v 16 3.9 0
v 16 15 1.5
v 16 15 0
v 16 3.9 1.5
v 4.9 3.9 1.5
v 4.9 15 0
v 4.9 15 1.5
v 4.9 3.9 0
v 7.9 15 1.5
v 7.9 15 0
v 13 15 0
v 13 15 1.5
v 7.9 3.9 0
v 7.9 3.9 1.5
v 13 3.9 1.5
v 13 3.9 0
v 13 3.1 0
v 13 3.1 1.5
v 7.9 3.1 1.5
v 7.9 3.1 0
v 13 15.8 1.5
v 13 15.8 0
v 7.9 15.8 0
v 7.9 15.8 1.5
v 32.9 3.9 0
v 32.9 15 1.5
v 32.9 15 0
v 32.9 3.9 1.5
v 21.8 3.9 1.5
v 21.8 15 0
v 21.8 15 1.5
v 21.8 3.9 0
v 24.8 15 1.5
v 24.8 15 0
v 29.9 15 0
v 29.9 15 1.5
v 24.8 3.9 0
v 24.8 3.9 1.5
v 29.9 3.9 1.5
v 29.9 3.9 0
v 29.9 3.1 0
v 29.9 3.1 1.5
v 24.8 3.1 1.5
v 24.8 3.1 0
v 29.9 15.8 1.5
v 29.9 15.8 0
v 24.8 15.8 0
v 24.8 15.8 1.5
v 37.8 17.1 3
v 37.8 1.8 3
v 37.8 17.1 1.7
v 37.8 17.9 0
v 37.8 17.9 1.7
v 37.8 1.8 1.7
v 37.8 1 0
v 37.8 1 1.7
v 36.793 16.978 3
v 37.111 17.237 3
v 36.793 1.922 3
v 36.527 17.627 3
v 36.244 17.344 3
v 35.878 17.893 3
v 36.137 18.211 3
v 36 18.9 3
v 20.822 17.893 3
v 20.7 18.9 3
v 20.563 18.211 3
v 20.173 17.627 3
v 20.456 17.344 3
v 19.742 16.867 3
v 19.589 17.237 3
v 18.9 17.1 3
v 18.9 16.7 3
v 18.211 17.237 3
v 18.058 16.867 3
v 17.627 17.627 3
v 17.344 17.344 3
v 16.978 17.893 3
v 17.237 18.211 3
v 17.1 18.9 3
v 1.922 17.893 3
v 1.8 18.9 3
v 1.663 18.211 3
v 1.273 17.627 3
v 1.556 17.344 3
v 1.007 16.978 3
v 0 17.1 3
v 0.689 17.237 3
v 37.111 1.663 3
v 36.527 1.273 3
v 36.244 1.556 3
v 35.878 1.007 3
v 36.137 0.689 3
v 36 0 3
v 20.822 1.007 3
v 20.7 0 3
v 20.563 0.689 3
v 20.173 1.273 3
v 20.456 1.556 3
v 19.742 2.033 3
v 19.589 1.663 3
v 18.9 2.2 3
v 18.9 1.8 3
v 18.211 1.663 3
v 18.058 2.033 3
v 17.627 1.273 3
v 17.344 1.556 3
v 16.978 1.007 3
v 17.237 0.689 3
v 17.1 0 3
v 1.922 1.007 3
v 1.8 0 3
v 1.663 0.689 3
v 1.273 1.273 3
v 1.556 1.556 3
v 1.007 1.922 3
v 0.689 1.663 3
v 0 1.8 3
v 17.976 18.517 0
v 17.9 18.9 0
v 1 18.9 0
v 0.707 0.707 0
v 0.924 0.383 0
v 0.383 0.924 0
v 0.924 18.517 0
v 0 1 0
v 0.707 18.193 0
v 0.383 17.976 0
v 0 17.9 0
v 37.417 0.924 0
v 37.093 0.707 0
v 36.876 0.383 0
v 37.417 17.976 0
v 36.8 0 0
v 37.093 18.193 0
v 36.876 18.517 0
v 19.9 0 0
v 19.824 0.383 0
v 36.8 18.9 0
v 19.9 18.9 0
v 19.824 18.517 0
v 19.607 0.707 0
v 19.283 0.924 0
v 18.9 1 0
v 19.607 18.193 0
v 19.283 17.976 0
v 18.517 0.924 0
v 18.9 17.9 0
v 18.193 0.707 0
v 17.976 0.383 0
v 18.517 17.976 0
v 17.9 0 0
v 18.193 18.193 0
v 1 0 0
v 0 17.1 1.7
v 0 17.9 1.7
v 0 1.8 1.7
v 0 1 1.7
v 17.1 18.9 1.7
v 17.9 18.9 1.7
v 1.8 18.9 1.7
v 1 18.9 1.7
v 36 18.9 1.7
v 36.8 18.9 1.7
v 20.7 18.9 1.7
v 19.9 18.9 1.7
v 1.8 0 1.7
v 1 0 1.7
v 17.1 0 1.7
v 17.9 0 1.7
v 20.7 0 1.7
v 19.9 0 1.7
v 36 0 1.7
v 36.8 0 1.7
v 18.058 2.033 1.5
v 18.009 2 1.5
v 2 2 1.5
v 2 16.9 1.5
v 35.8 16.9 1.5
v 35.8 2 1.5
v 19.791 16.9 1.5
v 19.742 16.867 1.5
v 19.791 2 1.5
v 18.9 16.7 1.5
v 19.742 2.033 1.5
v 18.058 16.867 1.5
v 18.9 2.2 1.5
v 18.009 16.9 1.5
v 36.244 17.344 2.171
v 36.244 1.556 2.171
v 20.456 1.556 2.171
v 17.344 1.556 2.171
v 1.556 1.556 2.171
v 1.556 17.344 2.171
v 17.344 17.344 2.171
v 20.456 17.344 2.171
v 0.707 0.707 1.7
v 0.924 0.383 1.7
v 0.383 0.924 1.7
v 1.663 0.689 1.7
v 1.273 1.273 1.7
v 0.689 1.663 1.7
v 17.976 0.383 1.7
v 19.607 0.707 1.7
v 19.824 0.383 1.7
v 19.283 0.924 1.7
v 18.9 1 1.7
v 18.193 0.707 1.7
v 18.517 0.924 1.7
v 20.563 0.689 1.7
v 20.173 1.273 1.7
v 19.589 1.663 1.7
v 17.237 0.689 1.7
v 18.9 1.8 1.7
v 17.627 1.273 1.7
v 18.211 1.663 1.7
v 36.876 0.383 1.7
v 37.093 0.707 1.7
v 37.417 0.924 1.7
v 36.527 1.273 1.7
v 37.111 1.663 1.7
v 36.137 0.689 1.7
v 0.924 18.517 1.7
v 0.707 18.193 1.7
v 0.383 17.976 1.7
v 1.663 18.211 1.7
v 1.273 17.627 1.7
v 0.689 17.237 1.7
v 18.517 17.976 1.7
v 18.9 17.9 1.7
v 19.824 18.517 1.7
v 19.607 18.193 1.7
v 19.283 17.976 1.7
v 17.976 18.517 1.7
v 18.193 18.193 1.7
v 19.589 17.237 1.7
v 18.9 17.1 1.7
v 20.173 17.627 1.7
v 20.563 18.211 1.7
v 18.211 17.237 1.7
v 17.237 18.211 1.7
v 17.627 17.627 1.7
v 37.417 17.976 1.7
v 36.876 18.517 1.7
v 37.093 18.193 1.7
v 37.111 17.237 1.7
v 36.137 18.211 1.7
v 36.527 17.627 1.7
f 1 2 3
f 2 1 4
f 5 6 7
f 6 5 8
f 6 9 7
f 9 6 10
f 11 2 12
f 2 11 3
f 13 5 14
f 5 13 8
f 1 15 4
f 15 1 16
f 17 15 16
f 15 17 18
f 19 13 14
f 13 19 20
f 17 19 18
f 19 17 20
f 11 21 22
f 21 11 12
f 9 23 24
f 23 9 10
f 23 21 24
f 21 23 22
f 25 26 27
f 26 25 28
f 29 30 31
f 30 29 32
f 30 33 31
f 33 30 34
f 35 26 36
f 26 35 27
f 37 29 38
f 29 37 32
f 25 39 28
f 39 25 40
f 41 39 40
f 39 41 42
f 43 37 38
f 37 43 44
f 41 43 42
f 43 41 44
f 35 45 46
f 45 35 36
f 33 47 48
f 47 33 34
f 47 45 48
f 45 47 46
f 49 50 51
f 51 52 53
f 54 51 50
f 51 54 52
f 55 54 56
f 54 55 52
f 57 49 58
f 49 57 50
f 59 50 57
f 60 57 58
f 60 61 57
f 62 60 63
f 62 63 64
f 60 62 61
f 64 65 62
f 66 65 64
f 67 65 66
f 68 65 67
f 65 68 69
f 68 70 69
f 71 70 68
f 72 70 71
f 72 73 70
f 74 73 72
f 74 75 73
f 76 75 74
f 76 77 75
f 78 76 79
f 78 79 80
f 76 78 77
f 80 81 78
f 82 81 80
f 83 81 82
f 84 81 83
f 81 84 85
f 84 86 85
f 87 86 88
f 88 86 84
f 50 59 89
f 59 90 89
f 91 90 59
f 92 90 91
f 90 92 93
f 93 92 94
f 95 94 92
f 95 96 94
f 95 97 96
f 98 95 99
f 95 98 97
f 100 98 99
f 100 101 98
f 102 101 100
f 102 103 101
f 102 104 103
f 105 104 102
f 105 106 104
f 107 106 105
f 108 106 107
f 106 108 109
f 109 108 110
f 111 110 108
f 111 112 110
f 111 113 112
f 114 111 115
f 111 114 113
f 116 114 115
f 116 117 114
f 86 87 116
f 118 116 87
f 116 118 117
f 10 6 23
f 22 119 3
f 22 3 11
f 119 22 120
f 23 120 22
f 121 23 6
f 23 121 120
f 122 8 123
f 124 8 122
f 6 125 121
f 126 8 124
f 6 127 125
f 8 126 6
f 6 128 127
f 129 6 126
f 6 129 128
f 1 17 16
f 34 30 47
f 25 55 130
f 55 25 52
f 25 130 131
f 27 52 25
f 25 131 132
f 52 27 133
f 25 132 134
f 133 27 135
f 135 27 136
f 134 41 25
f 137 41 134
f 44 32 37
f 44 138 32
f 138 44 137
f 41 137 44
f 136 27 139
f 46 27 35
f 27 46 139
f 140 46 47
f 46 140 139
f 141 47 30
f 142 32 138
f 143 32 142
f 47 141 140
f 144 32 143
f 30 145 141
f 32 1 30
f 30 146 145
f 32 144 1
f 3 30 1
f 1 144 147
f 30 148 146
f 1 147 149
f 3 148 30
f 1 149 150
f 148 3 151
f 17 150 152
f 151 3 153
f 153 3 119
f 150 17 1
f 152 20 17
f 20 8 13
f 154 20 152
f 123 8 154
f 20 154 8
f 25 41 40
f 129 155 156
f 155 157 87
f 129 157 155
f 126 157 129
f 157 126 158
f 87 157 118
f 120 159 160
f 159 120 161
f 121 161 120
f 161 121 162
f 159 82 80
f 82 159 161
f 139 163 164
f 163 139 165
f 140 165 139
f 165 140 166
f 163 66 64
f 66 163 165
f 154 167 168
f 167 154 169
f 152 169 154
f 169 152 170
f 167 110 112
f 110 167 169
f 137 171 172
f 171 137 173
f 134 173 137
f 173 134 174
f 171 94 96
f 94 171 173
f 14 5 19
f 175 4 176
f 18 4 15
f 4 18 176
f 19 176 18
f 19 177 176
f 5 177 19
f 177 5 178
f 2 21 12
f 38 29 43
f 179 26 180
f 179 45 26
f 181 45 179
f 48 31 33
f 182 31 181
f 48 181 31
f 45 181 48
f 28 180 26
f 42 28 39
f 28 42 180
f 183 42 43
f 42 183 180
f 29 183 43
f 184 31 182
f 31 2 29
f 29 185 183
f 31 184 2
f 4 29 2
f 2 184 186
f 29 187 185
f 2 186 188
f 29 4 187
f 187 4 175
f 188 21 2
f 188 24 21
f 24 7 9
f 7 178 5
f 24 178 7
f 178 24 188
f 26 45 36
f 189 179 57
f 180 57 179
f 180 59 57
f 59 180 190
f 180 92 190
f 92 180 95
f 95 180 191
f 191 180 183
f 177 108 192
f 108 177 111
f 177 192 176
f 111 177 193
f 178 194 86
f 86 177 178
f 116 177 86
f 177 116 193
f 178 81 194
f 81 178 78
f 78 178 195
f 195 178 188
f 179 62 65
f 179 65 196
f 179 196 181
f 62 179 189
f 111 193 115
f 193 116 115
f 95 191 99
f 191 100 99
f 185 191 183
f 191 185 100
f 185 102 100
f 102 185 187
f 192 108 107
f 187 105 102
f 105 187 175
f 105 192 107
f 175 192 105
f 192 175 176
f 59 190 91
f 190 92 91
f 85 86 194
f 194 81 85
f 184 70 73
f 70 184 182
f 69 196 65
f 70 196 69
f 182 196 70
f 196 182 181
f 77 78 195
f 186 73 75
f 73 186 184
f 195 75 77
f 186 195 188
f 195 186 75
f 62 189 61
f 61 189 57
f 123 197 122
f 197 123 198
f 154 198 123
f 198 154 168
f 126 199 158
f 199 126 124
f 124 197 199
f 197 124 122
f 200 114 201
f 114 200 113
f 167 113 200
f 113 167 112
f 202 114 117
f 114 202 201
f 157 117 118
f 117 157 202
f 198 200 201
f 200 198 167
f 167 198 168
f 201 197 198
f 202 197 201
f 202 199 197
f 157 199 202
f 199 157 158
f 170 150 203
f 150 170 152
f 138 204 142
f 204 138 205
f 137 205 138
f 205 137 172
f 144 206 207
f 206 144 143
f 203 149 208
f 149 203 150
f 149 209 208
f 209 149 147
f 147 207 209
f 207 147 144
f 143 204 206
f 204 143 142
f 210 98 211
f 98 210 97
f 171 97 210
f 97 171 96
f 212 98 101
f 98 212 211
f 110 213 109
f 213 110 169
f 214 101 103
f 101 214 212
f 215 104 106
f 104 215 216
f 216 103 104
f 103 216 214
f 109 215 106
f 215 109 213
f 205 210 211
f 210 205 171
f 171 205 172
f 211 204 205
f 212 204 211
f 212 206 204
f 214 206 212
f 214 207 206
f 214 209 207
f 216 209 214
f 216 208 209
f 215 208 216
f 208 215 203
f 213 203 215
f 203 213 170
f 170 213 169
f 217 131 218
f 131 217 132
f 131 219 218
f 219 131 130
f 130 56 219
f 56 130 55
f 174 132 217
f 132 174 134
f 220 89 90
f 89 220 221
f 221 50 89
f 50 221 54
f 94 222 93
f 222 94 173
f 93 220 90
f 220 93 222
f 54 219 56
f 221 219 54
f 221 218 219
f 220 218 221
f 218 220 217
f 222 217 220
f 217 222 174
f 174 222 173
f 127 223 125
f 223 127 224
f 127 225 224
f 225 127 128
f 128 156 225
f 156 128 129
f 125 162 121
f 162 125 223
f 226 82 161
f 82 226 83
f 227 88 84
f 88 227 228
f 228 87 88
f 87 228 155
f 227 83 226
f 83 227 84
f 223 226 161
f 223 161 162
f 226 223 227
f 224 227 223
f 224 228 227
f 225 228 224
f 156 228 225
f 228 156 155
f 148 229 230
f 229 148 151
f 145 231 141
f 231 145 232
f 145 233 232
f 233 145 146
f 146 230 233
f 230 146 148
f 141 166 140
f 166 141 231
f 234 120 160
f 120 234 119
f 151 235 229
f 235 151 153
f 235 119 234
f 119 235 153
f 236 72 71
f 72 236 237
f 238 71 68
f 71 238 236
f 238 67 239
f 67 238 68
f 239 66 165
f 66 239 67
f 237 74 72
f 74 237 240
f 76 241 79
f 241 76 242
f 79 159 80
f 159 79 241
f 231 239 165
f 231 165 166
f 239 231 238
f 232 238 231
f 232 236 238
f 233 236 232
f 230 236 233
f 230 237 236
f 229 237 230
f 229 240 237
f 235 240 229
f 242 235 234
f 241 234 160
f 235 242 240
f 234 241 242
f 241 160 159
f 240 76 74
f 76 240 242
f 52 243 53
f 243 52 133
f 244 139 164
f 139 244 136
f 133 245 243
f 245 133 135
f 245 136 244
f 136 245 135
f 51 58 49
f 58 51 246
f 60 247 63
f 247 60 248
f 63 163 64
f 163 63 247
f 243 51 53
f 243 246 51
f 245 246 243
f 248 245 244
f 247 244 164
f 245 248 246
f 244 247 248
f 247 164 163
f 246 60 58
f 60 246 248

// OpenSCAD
//OpenSCAD-Skript

//Moduldefinition mit Parametern für Frontplattensystem im 19mm-Raster
module FrontElem (
//Parameter
xwert=2,        //Anzahl der Segmente in horizontaler Richtung
ywert=1,        //Anzahl der Segmente in vertikaler Richtung
segment=18.9,   //Kantenlänge des Segments
hght=3.0,       //Höhe des Rands des Frontplattensegments
thick=1.5,      //verbleibende Dicke des Frontplattensegments
wo=1.0,         //Wandstärke oben
wu=2.0,         //Wandstärke unten
M3=false,       //Bohrungen für M3-Zylinderkopf-Inbusschraube
skd3=5.6,       //Schraubenkopfdurchmesser M3-Schraube
skh3=3.3,       //Schraubenkopfhöhe M3-Schraube
dsh3=3.1,       //Schaftdurchmesser M3-Schraube
dvst3=7,        //Verstärkung für M3-Schraube
B2mm=true,      //Bohrungen für 2mm-Schneidschrauben
skd2=3.6,       //Schraubenkopfdurchmesser 2mm-Schraube (4.4)
skh2=1.3,       //Schraubenkopfhöhe 2mm-Schraube
dsh2=2.0,       //Schaftdurchmesser 2mm-Schraube
dvst2=4.4,      //Verstärkung für 2mm-Schraube
Btext=6.0,      //Breite Beschriftungsband
Ltext=12,       //Länge Beschriftungsband
Dtext=0.3,      //Tiefe Beschriftungsfeld, oder Null
LEDdia=5.0,     //Durchmesser LED
LEDr=5.0,       //Kantenlänge quadratische LED
LEDB=5.0,       //Breite der Rechteck-LED
LEDH=3.0,       //Höhe der Rechteck-LED
KSWdia=6.0,     //Schaftdurchmesser Kippschalter
RSWdia=9.2,     //Schaftdurchmesser Drehschalter
RSWdist=9.4,    //Mittenabstand Pin
RSWpin=3.0,     //Durchmesser Pin
POTdia=6.8,     //Schaftdurchmesser Poti
TRMdia=4.0,     //Bohrung für Polklemme M4
TRSdia=6.0,     //Bohrung für Telefonbuchse 4mm
MCdia=11.8,     //Bohrung für MC-Buchse 4mm
MCdist=10.4,    //Abstand Abflachungen
BNCdia=9.5,     //Durchmesser Bohrung
BNCdist=8.0,    //Abstand Abflachung
PM3B=22.5,      //Breite Panelmeter 3-stellig
PM3H=14.5,      //Höhe Panelmeter 3-stellig
PM4B=30.0,      //Breite Panelmeter 4-stellig
PM4H=14.2,     //Höhe Panelmeter 4-stellig
leni=6,leno=13.1,swl=8.1,swh=4.1,balken=5.1
)
//Beginn Modul
{
difference(){   //difference 1
union(){        //union 1
difference(){   //difference 2
union(){        //union 2
    //alles, was vor der nächsten geschweiften Klammer steht, wird zusammengefügt (union 2)
//Körper des Frontplattensegments
cube([xwert*segment, ywert*segment, hght]);


}               //union 2 end
    //alles, was vor der nächsten geschweiften Klammer steht, wird davon abgezogen (difference 2)
//Einsenkung in das Segment
polyhedron(
               points= [[wu,wu,thick],                                  //0 unten
                        [xwert*segment-wu,wu,thick],                    //1 unten
                        [xwert*segment-wu,ywert*segment-wu,thick],      //2 unten
                        [wu,ywert*segment-wu,thick],                    //3 unten
                        [wo,wo,hght+0.01],                              //4 oben
                        [wo,ywert*segment-wo, hght+0.01],               //5 oben
                        [xwert*segment-wo,ywert*segment-wo,hght+0.01],  //6 oben
                        [xwert*segment-wo,wo,hght+0.01],                //7 oben
                       ],
               faces=  [[0,1,2,3],      //Boden
                        [0,4,7,1],      //Deckel
                        [1,7,6,2],      //Front
                        [2,6,5,3],      //Seitenwand rechts
                        [3,5,4,0],      //Rückwand
                        [4,5,6,7]]      //Seitenwand links
               );   
//Ausschnitt für Tasterhülsen (bei einzelner Hülse translate() weglassen
translate([-segment/2+1,0,0]) {
translate([(xwert*segment)/2-leno/2+1,(ywert*segment)/2-leno/2+1,-0.1]) cube([leno-2,leno-2,swh+swl]);
translate([(xwert*segment)/2-balken/2,(ywert*segment)/2-leno/2+0.2,-0.1]) cube([balken,(leno-leni)/2-0.8,swh+swl+3]);
translate([(xwert*segment)/2-balken/2,(ywert*segment)/2+leno/2-0.2-(leno-leni)/2+0.8,-0.1]) cube([balken,(leno-leni)/2-0.8,swh+swl+3]);
}
translate([segment/2-1,0,0]) {
translate([(xwert*segment)/2-leno/2+1,(ywert*segment)/2-leno/2+1,-0.1]) cube([leno-2,leno-2,swh+swl]);
translate([(xwert*segment)/2-balken/2,(ywert*segment)/2-leno/2+0.2,-0.1]) cube([balken,(leno-leni)/2-0.8,swh+swl+3]);
translate([(xwert*segment)/2-balken/2,(ywert*segment)/2+leno/2-0.2-(leno-leni)/2+0.8,-0.1]) cube([balken,(leno-leni)/2-0.8,swh+swl+3]);
}
/*
//Bohrung für LED mittig (Mindestgröße 1x1)
translate([xwert*segment/2,ywert*segment/2-3,-0.1])  cylinder(d=LEDdia, h=10, $fn=32);
*/

/*
//Bohrung für LED nach unten versetzt mit Textfeld darüber (Mindestgröße 1x1, bei 10mm LED 1x2)
translate([xwert*segment/2,ywert*segment/2-3,-0.1])  cylinder(d=LEDdia, h=10, $fn=32);
translate([xwert*segment/2-Ltext/2,ywert*segment/2,thick-Dtext+0.05])  cube([Ltext, Btext, Dtext]); 
*/

/*
//Bohrung für Kippschalter mittig (Mindestgröße 1x1)
translate([xwert*segment/2,ywert*segment/2,-0.1])  cylinder(d=KSWdia, h=10, $fn=32); 
*/

/*
//Bohrungen für Drehschalter mit Pin (Mindestgröße 2x2)
translate([xwert*segment/2,ywert*segment/2,-0.1])  cylinder(d=RSWdia, h=10, $fn=32);
translate([xwert*segment/2+RSWdist,ywert*segment/2,-0.1])  cylinder(d=RSWpin, h=1.5, $fn=32);
*/

/*
//Bohrung für Potentiometer 3mm-Schaft (Mindestgröße 1x1)
translate([xwert*segment/2,ywert*segment/2,-0.1])  cylinder(d=POTdia, h=10, $fn=32);
*/

/*
//Bohrung für 4mm-Polklemme M4 (Mindestgröße 1x1)
translate([xwert*segment/2,ywert*segment/2,-0.1])  cylinder(d=TRMdia, h=10, $fn=32);
*/       

/*
//Bohrung für 4mm-Telefonbuchse (Mindestgröße 1x1)
translate([xwert*segment/2,ywert*segment/2,-0.1])  cylinder(d=TRSdia, h=10, $fn=32);
*/

/*
//Bohrung für 4mm-MC-Buchse (Mindestgröße 2x2), siehe auch union1 für Abflachungen
translate([xwert*segment/2,ywert*segment/2,-0.1])  cylinder(d=MCdia, h=10, $fn=32);
*/

/*
//Bohrung für BNC-Buchse (Mindestgröße 1x1), siehe auch union1 für Abflachungen
translate([xwert*segment/2,ywert*segment/2,-0.1])  cylinder(d=BNCdia, h=10, $fn=32);
*/

/*
//Ausschnitt Panelmeter 3-stellig (Mindestgröße 2x1)
translate([xwert*segment/2-PM3B/2,ywert*segment/2-PM3H/2,-0.1])  cube([PM3B, PM3H, 10]);
*/

/*
//Ausschnitt Panelmeter 4-stellig (Mindestgröße 2x1)
translate([xwert*segment/2-PM4B/2,ywert*segment/2-PM4H/2,-0.1])  cube([PM4B, PM4H, 10]);
*/       
        
}  //difference 2 end
    //alles, was vor der nächsten geschweiften Klammer steht, wird dazu hinzugefügt (union 1)
//Verstärkungen für Schrauben x-Achse unten
for (x=[0:segment:xwert*segment])
{
if (M3==true) translate([x,0,0]) cylinder(d=dvst3,h=hght,$fn=16);
if (B2mm==true) translate([x,0,0]) cylinder(d=dvst2,h=hght,$fn=16);
}
//Verstärkungen für Schrauben x-Achse oben
for (x=[0:segment:xwert*segment])
{
if (M3==true) translate([x,ywert*segment,0]) cylinder(d=dvst3,h=hght,$fn=16);
if (B2mm==true) translate([x,ywert*segment,0]) cylinder(d=dvst2,h=hght,$fn=16);
}
//Verstärkungen für Schrauben y-Achse links
for (y=[0:segment:ywert*segment])
{
if (M3==true) translate([0,y,0]) cylinder(d=dvst3,h=hght,$fn=16);
if (B2mm==true) translate([0,y,0]) cylinder(d=dvst2,h=hght,$fn=16);
}
//Verstärkungen für Schrauben y-Achse rechts
for (y=[0:segment:ywert*segment])
{
if (M3==true) translate([xwert*segment,y,0]) cylinder(d=dvst3,h=hght,$fn=16);
if (B2mm==true) translate([xwert*segment,y,0]) cylinder(d=dvst2,h=hght,$fn=16);
}

/*
//Abflachungen für 4mm-MC-Buchse (Mindestgröße 2x2)
translate([xwert*segment/2-5,ywert*segment/2+MCdist/2,0])  cube([10,3,thick]);
translate([xwert*segment/2-5,ywert*segment/2-MCdist/2-3,0])  cube([10,3,thick]);
*/

/*
//Abflachungen für BNC-Buchse (Mindestgröße 1x1)
translate([xwert*segment/2-5,ywert*segment/2+BNCdist/2,0])  cube([10,3,thick]);
translate([xwert*segment/2-5,ywert*segment/2-BNCdist/2-3,0])  cube([10,3,thick]);
*/

}               //union 1 end
    //alles, was vor der nächsten geschweiften Klammer steht, wird davon wieder abgezogen (difference 1)
//Bohrungen für Schrauben x-Achse unten
for (x=[0:segment:xwert*segment])
{
if (M3==true) translate([x,0,-0.1]) cylinder(d=dsh3,h=2*hght,$fn=16);
if (M3==true) translate([x,0,hght-skh3]) cylinder(d=skd3,h=2*hght,$fn=16);
if (B2mm==true) translate([x,0,-0.1]) cylinder(d=dsh2,h=2*hght,$fn=16);
if (B2mm==true) translate([x,0,hght-skh2]) cylinder(d=skd2,h=2*hght,$fn=16); 
}
//Bohrungen für Schrauben x-Achse oben
for (x=[0:segment:xwert*segment])
{
if (M3==true) translate([x,ywert*segment,-0.1]) cylinder(d=dsh3,h=2*hght,$fn=16);
if (M3==true) translate([x,ywert*segment,hght-skh3]) cylinder(d=skd3,h=2*hght,$fn=16);
if (B2mm==true) translate([x,ywert*segment,-0.1]) cylinder(d=dsh2,h=2*hght,$fn=16);
if (B2mm==true) translate([x,ywert*segment,hght-skh2]) cylinder(d=skd2,h=2*hght,$fn=16); 
}
//Bohrungen für Schrauben y-Achse links
for (y=[0:segment:ywert*segment])
{
if (M3==true) translate([0,y,-0.1]) cylinder(d=dsh3,h=2*hght,$fn=16);
if (M3==true) translate([0,y,hght-skh3]) cylinder(d=skd3,h=2*hght,$fn=16);
if (B2mm==true) translate([0,y,-0.1]) cylinder(d=dsh2,h=2*hght,$fn=16);
if (B2mm==true) translate([0,y,hght-skh2]) cylinder(d=skd2,h=2*hght,$fn=16); 
}
//Bohrungen für Schrauben y-Achse rechts
for (y=[0:segment:ywert*segment])
{
if (M3==true) translate([xwert*segment,y,-0.1]) cylinder(d=dsh3,h=2*hght,$fn=16);
if (M3==true) translate([xwert*segment,y,hght-skh3]) cylinder(d=skd3,h=2*hght,$fn=16);
if (B2mm==true) translate([xwert*segment,y,-0.1]) cylinder(d=dsh2,h=2*hght,$fn=16);
if (B2mm==true) translate([xwert*segment,y,hght-skh2]) cylinder(d=skd2,h=2*hght,$fn=16); 
}
//Abschneiden Verstärkungen unten
translate([-250,-10,-0.1])
cube([500,10,25]);
//Abschneiden Verstärkungen oben
translate([-250,ywert*segment,-0.1])
cube([500,10,25]);
//Abschneiden Verstärkungen links
translate([-10,-250,-0.1])
cube([10,500,25]);
//Abschneiden Verstärkungen rechts
translate([xwert*segment,-250,-0.1])
cube([10,500,25]);
}               //difference 1 end

}  //module end

//Hier werden Instanzen des Moduls aufgerufen
translate([0,0,0]) FrontElem();
